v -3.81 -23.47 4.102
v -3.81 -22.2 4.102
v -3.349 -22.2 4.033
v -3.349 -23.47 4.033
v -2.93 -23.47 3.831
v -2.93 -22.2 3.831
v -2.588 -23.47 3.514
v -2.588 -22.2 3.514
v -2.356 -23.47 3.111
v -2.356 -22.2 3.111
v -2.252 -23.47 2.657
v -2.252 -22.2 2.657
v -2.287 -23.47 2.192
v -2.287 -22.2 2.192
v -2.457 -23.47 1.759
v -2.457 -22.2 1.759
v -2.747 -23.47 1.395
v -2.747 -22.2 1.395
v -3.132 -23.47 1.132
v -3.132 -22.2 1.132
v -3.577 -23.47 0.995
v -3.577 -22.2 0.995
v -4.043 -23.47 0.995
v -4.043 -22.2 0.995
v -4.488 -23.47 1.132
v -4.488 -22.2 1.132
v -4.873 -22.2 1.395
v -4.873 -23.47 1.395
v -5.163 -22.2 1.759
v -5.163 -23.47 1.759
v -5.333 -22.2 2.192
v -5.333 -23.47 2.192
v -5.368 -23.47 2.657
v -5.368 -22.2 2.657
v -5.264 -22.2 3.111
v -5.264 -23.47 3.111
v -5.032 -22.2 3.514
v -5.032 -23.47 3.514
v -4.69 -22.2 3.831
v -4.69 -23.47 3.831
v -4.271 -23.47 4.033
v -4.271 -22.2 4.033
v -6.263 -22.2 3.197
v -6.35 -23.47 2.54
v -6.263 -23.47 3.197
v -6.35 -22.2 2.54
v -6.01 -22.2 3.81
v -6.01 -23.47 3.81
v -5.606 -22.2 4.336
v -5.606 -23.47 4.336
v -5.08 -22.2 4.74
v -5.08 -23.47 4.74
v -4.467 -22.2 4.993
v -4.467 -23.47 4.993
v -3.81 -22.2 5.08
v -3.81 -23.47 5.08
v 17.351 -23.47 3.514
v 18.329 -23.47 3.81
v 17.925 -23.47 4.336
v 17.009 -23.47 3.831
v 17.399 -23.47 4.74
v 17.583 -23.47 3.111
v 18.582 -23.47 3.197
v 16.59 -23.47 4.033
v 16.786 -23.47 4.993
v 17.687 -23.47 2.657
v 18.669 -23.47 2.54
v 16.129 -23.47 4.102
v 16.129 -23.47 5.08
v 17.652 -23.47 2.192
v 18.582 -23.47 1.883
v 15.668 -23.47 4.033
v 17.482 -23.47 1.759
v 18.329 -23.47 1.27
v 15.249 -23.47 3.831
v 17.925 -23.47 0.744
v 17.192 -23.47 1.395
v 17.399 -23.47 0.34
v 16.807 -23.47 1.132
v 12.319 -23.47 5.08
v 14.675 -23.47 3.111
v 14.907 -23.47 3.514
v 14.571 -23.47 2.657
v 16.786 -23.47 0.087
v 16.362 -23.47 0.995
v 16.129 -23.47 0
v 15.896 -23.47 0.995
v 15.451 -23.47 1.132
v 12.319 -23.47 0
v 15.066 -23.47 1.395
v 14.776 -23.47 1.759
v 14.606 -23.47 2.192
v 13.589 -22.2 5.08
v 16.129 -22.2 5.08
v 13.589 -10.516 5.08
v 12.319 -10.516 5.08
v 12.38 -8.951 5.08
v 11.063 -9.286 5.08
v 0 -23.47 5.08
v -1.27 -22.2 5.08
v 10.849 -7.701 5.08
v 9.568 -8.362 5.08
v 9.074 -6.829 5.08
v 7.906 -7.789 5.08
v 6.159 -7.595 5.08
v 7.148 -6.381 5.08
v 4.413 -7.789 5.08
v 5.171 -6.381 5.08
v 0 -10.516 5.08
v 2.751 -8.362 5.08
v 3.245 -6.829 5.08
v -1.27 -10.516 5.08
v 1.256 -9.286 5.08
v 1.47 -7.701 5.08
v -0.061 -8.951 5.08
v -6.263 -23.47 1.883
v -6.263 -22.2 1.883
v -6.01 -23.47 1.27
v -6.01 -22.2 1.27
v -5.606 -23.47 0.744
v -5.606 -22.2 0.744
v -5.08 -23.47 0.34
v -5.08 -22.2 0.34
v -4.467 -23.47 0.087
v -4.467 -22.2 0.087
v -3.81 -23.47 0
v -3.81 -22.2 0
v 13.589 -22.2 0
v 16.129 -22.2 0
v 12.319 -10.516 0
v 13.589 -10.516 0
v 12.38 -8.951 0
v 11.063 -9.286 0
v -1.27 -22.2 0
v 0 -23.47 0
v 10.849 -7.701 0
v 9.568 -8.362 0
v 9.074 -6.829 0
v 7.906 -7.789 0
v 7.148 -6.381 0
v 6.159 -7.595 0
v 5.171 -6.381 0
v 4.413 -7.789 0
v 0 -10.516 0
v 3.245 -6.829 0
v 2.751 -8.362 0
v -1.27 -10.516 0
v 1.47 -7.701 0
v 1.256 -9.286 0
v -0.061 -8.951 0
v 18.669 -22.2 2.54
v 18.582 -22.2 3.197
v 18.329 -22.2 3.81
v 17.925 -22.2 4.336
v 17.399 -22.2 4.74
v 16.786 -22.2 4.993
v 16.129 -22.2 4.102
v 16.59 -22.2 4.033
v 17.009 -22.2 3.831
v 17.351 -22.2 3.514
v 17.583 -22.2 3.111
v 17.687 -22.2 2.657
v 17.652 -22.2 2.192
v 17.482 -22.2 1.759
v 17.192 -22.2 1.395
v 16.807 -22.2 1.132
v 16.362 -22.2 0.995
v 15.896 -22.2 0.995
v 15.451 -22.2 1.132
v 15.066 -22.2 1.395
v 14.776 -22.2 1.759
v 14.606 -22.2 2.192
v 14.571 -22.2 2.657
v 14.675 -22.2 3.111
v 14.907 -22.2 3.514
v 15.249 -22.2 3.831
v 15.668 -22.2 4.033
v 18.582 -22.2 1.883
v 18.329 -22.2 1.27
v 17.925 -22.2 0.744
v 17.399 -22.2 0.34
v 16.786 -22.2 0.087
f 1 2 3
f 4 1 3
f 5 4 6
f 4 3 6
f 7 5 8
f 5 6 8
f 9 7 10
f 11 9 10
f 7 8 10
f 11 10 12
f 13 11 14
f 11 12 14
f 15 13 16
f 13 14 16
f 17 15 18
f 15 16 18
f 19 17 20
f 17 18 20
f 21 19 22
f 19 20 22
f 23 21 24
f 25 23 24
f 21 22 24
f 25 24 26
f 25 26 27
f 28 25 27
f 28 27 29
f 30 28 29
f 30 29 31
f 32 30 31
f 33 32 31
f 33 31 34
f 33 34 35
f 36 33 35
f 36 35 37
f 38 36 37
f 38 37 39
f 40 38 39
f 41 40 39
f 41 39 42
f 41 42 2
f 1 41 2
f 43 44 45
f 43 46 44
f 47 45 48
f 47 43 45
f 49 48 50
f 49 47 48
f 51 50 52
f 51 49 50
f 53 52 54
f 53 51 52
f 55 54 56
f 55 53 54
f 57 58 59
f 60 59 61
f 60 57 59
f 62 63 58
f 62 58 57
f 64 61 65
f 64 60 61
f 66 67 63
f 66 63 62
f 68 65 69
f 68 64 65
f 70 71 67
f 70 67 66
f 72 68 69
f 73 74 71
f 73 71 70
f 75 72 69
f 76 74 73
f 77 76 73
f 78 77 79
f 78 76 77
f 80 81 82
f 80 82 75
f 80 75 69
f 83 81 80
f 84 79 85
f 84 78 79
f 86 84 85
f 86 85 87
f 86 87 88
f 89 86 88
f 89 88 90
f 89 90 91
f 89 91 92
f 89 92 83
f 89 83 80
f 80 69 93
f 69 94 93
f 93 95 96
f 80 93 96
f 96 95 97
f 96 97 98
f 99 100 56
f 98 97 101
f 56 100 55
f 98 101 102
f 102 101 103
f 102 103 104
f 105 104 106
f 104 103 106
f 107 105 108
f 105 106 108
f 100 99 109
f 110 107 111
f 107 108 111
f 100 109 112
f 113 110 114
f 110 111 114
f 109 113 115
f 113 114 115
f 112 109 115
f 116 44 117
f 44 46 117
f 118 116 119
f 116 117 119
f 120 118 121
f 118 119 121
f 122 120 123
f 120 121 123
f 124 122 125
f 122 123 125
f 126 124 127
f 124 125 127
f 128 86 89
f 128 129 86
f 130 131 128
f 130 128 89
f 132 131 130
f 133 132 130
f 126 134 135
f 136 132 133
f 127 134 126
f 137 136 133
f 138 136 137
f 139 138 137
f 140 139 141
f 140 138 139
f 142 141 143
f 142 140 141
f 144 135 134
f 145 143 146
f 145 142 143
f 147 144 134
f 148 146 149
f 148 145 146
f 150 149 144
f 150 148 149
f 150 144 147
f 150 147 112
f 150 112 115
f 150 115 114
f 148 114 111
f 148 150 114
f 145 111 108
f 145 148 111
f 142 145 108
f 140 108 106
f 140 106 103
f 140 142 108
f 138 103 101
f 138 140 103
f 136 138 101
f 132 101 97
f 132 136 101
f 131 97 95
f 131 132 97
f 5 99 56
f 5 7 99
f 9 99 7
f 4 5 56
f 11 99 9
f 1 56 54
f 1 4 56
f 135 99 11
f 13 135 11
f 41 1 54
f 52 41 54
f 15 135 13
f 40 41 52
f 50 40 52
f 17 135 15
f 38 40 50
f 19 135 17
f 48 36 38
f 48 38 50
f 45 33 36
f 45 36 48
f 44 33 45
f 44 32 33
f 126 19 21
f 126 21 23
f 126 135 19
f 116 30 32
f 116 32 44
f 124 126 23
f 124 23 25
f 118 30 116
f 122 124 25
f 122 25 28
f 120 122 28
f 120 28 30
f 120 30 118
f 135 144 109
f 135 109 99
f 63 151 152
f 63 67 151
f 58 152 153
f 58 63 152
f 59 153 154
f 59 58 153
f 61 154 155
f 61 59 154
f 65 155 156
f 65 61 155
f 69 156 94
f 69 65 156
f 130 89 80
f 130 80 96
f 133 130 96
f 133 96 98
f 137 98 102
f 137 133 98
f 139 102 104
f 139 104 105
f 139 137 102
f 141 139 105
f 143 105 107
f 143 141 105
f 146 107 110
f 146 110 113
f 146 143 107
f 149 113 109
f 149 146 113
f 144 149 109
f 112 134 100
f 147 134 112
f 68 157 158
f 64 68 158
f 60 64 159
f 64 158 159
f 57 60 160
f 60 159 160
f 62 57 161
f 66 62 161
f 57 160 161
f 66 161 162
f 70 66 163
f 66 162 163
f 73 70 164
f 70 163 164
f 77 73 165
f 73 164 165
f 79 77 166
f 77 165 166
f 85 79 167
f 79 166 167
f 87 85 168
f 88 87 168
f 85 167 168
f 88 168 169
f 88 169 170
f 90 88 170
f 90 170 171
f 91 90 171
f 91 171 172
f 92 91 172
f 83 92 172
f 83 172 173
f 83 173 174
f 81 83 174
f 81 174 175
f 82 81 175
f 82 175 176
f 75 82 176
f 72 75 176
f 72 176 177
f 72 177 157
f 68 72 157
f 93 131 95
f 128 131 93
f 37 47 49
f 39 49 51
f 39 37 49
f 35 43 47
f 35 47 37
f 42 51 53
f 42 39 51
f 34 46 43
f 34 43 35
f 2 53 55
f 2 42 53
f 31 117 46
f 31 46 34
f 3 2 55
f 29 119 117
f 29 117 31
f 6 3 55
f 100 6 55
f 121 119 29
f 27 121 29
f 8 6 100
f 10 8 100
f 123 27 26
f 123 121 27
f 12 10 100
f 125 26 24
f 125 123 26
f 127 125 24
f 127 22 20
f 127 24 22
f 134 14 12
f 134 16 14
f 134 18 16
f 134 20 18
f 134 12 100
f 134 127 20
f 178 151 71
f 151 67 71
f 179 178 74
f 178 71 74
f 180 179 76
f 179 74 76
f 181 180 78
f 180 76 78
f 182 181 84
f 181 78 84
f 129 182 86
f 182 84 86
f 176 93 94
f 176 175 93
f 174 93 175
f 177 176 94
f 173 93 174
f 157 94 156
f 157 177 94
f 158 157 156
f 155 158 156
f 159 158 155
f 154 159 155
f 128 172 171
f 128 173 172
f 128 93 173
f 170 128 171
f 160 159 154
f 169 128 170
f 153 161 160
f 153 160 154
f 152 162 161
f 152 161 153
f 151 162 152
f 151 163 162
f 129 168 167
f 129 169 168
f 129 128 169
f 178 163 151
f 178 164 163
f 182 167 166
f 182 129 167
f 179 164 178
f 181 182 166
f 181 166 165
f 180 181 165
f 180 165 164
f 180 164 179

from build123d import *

# Parameters (mm, degrees)
BOSS_EXTRUDE1_DEPTH = 5.08
FILLET1_R           = 2.54
SKETCH2_R           = 1.5625
CUT_EXTRUDE1_DEPTH  = 26.027057078


with BuildPart() as part:
    # Sketch1 → Boss-Extrude1 (new body)
    with BuildSketch(Plane.XY):
        with BuildLine():
            Line((18.669, -23.469960484), (12.319, -23.469960484))
            Line((12.319, -23.469960484), (12.319, -10.515960484))
            ThreePointArc((12.319, -10.515960484), (6.1595, -7.594960484), (0, -10.515960484))
            Line((0, -10.515960484), (0, -23.469960484))
            Line((0, -23.469960484), (-6.35, -23.469960484))
            Line((-6.35, -23.469960484), (-6.35, -22.199960484))
            Line((-6.35, -22.199960484), (-1.27, -22.199960484))
            Line((-1.27, -22.199960484), (-1.27, -10.515960484))
            ThreePointArc((-1.27, -10.515960484), (6.1595, -6.324960484), (13.589, -10.515960484))
            Line((13.589, -10.515960484), (13.589, -22.199960484))
            Line((13.589, -22.199960484), (18.669, -22.199960484))
            Line((18.669, -22.199960484), (18.669, -23.469960484))
        make_face()
    extrude(amount=BOSS_EXTRUDE1_DEPTH)

    # Fillet1
    fillet1_edges = [part.edges().sort_by_distance(p)[0] for p in [
        (-6.35, -22.834960484, 0),
        (-6.35, -22.834960484, 5.08),
        (18.669, -22.834960484, 0),
        (18.669, -22.834960484, 5.08),
    ]]
    fillet(fillet1_edges, radius=FILLET1_R - 0.0001)  # a hair under: the kernel refuses the full size

    # Sketch2 → Cut-Extrude1 (cut, through all)
    with BuildSketch(Plane(origin=(0, -22.199960484, 0), x_dir=(1, 0, 0), z_dir=(0, 1, 0))):
        with Locations(Location((16.129, -2.54, 0), (0, 0, 270))):
            Circle(SKETCH2_R)
        with Locations(Location((-3.81, -2.54, 0), (0, 0, 270))):
            Circle(SKETCH2_R)
    extrude(amount=-CUT_EXTRUDE1_DEPTH, mode=Mode.SUBTRACT)


solid = part.part
